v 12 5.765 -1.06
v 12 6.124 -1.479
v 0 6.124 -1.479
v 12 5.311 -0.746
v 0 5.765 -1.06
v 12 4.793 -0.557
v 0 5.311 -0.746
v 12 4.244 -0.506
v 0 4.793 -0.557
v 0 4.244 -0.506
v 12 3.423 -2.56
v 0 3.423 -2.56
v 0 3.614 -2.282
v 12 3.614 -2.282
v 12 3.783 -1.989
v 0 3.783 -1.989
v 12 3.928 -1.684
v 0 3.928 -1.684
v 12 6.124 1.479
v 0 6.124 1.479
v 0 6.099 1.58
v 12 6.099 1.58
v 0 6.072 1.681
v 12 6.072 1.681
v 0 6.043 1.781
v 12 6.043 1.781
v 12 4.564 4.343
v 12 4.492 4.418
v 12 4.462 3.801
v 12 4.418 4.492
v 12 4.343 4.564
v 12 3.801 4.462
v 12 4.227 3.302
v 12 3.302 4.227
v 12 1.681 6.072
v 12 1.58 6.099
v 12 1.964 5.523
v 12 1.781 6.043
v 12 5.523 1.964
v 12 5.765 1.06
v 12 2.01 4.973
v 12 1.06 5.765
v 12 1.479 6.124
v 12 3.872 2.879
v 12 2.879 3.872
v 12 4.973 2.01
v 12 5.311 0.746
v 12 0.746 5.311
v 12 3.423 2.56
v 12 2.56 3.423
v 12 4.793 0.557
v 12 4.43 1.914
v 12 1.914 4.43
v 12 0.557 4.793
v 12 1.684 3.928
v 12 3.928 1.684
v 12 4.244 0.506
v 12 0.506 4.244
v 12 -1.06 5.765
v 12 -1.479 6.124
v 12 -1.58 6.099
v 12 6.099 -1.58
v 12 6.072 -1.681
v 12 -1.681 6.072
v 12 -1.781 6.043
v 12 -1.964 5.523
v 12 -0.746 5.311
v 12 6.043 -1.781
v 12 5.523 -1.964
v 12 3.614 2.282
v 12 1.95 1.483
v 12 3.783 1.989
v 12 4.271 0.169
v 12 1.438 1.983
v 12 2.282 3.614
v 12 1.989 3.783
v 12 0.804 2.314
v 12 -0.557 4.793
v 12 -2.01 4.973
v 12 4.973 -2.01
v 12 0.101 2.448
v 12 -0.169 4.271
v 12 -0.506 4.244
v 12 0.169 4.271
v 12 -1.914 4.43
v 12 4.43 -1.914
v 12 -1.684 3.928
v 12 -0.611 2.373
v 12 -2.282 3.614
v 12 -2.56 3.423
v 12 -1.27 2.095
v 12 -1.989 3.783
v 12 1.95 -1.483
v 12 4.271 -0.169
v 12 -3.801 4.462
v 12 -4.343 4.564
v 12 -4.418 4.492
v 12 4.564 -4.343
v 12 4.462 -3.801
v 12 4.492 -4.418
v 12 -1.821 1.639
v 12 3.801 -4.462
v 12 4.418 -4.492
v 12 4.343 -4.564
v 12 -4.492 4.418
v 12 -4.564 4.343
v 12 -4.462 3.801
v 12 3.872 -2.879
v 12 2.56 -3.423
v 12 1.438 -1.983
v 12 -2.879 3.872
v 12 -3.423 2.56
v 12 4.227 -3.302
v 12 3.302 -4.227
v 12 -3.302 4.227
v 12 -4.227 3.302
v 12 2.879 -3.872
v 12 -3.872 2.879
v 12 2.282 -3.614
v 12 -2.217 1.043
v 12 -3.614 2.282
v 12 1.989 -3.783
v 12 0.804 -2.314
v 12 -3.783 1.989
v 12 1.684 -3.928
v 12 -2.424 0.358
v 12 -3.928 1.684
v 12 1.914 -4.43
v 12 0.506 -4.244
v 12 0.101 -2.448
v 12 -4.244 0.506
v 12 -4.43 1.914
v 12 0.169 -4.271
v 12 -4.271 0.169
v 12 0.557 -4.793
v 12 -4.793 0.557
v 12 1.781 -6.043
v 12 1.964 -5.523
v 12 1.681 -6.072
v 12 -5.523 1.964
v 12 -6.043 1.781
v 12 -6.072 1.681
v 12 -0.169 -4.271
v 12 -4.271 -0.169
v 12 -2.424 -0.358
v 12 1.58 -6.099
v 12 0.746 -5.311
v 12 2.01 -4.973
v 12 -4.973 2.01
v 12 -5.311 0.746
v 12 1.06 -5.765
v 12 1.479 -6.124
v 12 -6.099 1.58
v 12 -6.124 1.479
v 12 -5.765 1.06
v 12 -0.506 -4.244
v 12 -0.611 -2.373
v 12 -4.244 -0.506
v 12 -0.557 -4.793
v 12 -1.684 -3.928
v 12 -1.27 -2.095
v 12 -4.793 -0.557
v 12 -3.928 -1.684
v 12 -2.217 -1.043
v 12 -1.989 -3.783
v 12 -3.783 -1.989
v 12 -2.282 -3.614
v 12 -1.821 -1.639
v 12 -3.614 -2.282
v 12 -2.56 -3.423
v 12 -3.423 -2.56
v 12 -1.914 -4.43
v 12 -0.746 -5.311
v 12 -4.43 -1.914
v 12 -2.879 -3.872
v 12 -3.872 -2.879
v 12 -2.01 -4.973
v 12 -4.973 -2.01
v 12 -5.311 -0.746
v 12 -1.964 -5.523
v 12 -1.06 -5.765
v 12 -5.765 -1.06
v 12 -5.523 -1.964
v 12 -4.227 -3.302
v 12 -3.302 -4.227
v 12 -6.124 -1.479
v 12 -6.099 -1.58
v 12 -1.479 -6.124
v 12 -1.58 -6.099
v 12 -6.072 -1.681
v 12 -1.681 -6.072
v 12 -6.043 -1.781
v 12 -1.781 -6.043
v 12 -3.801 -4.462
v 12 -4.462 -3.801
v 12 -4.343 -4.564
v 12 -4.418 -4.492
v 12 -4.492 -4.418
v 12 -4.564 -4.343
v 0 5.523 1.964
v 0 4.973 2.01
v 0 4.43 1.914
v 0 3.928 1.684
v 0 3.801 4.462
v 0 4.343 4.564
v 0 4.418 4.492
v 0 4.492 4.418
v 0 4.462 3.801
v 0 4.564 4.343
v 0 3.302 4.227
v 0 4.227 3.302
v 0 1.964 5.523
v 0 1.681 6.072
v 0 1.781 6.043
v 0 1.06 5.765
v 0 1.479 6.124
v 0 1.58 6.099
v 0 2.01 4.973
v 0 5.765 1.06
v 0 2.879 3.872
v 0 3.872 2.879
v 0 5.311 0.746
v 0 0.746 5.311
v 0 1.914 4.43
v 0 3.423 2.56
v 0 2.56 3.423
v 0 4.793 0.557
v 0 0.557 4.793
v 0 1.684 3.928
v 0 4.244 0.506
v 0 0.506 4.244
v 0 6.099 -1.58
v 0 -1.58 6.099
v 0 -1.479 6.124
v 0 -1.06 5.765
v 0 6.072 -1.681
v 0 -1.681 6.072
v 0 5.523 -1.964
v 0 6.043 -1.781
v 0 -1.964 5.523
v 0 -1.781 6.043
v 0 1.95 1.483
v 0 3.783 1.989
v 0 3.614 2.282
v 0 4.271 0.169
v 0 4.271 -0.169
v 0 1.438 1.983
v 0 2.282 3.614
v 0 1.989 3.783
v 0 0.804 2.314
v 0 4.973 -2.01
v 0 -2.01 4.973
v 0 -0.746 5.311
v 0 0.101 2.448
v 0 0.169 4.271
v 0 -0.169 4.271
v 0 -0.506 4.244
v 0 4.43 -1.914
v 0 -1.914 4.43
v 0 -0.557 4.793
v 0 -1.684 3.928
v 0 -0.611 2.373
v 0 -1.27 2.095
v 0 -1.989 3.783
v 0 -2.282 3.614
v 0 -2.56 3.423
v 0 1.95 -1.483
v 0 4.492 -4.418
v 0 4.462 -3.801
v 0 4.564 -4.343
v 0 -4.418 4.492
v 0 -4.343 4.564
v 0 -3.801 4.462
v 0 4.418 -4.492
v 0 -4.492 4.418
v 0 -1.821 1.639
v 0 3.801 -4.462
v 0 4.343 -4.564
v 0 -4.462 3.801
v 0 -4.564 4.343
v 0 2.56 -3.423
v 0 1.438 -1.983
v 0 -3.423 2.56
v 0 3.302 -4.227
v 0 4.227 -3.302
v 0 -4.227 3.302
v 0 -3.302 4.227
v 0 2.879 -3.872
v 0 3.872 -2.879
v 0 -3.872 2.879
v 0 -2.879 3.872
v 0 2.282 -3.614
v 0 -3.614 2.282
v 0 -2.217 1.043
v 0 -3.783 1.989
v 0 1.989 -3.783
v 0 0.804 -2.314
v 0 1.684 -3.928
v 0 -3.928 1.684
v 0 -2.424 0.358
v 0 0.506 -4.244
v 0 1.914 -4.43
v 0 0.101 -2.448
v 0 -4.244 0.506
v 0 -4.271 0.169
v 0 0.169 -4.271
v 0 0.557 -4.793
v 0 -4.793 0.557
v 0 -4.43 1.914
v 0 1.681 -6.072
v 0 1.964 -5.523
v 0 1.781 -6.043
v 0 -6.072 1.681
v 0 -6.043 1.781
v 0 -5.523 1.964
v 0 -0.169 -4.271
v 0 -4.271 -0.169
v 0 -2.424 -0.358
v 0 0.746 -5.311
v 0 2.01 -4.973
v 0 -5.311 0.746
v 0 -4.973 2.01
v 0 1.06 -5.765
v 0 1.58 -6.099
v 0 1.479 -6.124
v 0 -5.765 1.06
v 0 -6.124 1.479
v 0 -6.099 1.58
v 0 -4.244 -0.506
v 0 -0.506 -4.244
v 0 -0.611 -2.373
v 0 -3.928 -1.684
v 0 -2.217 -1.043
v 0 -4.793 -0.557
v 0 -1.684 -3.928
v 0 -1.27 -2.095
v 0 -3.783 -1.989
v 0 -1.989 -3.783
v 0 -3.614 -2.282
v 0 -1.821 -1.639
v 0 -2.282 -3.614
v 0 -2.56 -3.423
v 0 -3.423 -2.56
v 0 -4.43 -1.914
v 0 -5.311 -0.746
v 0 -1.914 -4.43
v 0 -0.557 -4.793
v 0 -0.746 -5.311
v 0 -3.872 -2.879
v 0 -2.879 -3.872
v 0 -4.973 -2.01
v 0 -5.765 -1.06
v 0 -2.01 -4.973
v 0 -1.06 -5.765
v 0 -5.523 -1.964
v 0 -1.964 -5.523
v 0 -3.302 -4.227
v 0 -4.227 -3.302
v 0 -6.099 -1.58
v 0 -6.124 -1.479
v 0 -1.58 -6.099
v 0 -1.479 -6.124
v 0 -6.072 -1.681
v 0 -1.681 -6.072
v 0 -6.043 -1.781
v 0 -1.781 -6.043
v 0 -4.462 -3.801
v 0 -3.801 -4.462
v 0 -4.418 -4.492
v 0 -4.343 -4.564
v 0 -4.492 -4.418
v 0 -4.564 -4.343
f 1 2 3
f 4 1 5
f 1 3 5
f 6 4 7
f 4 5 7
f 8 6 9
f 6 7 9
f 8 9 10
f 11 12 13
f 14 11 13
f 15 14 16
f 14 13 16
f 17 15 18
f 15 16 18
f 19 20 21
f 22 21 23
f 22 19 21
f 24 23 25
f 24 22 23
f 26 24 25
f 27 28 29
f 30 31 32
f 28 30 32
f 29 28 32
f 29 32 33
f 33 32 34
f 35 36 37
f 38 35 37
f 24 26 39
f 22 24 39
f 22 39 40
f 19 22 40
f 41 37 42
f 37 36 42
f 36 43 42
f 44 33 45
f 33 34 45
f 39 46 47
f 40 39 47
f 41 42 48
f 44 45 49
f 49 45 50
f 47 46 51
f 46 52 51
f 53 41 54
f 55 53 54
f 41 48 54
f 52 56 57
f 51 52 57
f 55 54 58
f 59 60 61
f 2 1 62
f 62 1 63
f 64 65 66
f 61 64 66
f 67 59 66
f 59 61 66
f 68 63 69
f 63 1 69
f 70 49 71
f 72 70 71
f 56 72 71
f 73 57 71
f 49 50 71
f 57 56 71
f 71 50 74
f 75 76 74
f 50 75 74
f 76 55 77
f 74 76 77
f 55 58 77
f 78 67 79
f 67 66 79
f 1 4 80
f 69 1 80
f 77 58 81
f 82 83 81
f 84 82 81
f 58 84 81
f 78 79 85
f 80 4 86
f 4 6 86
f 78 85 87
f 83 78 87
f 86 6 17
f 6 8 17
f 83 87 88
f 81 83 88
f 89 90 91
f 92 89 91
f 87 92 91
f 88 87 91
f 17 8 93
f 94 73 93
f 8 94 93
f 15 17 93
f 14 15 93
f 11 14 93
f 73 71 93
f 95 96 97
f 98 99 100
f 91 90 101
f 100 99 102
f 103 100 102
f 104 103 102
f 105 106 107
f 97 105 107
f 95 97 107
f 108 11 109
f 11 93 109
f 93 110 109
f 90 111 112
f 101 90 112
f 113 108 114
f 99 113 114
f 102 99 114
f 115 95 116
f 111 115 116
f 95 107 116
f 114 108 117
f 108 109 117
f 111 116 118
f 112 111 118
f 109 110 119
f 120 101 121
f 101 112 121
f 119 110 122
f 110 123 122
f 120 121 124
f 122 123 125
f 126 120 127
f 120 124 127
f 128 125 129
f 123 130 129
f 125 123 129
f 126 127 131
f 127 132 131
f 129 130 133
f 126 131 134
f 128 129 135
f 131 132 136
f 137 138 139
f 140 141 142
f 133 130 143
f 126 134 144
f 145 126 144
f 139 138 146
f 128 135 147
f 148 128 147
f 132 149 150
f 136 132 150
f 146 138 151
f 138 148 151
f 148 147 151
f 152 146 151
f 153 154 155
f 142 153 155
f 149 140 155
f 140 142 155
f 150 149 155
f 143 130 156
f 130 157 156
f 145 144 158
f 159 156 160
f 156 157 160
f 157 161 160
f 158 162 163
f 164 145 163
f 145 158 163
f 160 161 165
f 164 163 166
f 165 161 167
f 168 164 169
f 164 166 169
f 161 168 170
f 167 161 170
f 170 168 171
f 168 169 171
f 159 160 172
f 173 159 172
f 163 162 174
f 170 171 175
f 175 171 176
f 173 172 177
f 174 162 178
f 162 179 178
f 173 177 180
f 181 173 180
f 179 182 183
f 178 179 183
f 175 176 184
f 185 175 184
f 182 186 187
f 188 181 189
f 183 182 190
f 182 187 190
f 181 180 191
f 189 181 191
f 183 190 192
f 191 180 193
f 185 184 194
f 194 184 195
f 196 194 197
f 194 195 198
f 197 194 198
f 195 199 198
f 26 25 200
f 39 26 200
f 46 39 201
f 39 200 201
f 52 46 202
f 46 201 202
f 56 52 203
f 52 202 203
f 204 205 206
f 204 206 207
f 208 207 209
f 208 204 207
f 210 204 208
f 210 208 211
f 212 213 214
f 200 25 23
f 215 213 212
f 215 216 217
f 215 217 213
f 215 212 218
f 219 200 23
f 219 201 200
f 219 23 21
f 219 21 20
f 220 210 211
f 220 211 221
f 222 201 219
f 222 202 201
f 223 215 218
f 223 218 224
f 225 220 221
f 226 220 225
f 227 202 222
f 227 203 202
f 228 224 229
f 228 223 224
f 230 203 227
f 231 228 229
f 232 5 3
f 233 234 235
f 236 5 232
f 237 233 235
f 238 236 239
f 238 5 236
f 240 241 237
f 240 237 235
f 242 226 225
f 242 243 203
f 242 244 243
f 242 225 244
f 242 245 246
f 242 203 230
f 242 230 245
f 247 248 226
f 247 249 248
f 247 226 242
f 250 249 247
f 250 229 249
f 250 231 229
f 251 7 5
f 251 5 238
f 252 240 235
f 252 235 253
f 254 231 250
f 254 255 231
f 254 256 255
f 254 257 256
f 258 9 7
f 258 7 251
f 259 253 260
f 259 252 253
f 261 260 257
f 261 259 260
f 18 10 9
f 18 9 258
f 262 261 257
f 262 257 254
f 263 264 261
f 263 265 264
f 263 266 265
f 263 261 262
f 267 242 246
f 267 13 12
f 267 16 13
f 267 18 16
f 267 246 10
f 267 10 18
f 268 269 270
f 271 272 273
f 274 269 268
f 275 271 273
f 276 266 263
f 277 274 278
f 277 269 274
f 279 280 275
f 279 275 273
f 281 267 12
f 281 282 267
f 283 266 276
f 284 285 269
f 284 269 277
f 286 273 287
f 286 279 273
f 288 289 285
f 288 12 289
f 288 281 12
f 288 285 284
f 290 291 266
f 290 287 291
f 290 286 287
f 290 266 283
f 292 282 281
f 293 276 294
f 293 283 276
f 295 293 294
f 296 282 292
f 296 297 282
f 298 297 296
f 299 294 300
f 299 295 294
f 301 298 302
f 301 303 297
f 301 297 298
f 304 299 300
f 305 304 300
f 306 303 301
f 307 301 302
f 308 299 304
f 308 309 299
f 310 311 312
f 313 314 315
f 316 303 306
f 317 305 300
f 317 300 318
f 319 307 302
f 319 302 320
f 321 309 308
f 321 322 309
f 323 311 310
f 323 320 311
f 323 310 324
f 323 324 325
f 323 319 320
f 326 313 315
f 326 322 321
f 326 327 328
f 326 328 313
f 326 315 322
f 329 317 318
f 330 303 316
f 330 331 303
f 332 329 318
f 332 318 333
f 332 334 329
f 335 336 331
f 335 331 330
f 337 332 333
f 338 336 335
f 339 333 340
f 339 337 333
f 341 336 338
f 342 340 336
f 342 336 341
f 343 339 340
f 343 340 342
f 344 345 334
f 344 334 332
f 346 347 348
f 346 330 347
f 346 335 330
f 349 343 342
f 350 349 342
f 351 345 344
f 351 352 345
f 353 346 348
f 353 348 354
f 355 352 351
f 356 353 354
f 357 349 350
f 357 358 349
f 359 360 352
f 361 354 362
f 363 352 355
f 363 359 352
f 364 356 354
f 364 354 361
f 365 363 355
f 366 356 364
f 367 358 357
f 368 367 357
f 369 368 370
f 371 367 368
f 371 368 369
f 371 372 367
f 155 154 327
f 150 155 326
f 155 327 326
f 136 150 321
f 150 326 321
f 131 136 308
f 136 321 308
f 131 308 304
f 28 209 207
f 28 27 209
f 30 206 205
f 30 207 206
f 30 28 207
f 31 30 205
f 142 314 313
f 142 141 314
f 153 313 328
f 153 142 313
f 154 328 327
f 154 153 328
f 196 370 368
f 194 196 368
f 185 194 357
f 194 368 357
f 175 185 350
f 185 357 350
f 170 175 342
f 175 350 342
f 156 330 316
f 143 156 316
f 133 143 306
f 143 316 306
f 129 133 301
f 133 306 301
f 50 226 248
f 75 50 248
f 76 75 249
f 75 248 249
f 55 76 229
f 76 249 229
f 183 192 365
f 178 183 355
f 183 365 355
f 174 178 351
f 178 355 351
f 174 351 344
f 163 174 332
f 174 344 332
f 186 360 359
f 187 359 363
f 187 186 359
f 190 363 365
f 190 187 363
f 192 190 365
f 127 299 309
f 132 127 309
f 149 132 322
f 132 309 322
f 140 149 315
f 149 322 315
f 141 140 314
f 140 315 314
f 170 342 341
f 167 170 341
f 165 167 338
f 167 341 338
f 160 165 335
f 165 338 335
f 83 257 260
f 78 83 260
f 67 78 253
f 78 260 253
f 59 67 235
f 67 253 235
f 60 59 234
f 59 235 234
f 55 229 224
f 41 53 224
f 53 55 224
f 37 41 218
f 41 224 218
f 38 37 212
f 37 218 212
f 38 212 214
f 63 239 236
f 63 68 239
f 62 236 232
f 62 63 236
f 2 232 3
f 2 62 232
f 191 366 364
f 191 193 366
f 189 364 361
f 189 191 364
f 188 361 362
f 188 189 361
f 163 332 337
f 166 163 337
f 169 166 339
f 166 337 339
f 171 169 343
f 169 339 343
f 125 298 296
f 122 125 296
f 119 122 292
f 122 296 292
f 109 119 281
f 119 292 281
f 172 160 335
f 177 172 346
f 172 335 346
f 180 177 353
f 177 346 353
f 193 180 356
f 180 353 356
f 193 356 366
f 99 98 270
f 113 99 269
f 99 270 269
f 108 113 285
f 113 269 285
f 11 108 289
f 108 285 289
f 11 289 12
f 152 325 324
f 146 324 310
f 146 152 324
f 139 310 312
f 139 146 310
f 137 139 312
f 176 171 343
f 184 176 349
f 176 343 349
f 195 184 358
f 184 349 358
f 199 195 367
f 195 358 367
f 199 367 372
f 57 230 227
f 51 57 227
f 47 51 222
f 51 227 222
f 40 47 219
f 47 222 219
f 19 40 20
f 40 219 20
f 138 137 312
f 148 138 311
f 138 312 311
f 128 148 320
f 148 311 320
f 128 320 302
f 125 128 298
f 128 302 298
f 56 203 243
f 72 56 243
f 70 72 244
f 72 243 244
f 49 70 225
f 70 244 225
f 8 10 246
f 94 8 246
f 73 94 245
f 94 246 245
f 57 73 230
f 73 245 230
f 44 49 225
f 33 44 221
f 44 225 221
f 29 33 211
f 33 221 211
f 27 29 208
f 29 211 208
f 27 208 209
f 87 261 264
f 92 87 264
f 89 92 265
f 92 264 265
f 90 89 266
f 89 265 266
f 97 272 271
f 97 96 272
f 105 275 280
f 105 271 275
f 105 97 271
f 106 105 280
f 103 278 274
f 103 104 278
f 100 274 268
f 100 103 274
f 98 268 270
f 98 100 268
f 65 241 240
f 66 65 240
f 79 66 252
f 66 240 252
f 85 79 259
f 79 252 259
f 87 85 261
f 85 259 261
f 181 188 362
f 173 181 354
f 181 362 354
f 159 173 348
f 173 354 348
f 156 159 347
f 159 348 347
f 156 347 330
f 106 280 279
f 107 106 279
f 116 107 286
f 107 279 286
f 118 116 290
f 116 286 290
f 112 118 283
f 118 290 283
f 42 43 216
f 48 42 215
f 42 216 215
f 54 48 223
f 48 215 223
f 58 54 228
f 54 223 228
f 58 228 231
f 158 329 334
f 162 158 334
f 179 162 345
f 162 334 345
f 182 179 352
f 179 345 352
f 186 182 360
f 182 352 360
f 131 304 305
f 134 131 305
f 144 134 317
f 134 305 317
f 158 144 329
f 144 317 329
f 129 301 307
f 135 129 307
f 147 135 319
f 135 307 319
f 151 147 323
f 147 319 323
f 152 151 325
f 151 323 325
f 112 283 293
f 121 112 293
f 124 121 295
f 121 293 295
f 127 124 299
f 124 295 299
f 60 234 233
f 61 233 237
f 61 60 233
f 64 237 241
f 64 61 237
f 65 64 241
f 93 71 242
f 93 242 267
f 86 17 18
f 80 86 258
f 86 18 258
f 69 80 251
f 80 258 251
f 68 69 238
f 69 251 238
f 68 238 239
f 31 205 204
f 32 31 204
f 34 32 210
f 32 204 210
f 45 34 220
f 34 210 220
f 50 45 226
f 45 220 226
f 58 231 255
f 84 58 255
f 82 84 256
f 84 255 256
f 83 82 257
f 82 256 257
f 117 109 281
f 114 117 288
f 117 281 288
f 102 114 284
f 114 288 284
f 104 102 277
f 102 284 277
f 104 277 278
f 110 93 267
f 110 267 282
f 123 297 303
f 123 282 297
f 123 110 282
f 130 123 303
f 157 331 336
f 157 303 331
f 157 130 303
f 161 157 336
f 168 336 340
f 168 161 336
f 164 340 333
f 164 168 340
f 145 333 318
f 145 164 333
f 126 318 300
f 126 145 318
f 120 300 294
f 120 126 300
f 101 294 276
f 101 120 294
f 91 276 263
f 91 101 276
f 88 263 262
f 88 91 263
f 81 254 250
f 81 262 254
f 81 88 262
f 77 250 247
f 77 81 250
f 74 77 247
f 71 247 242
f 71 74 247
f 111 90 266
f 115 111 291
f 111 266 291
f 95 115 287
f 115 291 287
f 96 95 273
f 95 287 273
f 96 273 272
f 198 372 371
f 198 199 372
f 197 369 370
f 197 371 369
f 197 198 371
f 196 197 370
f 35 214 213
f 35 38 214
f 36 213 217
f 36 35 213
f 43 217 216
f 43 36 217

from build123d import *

# Parameters (mm, degrees)
BASPROSKE_W     = 12
BASPROSKE_H     = 6.3
TOOTHCUT_DEPTH  = 15.945902448
TEETHCUTS_COUNT = 12
TEETHCUTS_ANGLE = 330
BORE_DEPTH      = 50.0000508


with BuildPart() as part:
    # BasProSke → Base-Revolve (revolve)
    with BuildSketch(Plane(origin=(0, 0, 0), x_dir=(1, 0, 0), z_dir=(0, 1, 0)), mode=Mode.PRIVATE) as base_revolve_sk:
        with Locations((6, 3.15)):
            Rectangle(BASPROSKE_W, BASPROSKE_H)
    revolve(base_revolve_sk.sketch.rotate(Axis((-10, 0, 0), (1, 0, 0)), 180), axis=Axis((-10, 0, 0), (1, 0, 0)))

    # TooCutSke → ToothCut (cut, through all)
    with BuildSketch(Plane(origin=(0, 0, 0), x_dir=(0, 0, -1), z_dir=(1, 0, 0))):
        with BuildLine():
            ThreePointArc((0.505712998, 4.243975773), (0, 4.274), (-0.505712998, 4.243975773))
            ThreePointArc((-0.505712998, 4.243975773), (-0.754225381, 5.326869831), (-1.508135905, 6.142980649))
            ThreePointArc((-1.508135905, 6.142980649), (0, 6.3254), (1.508135905, 6.142980649))
            ThreePointArc((1.508135905, 6.142980649), (0.754225381, 5.326869831), (0.505712998, 4.243975773))
        make_face()
    toothcut = extrude(amount=TOOTHCUT_DEPTH, mode=Mode.SUBTRACT)

    # TeethCuts: ToothCut ×12 about axis
    teethcuts_axis = Axis((-10, 0, 0), (1, 0, 0))
    for i in range(1, TEETHCUTS_COUNT):
        add(toothcut.rotate(teethcuts_axis, i * TEETHCUTS_ANGLE / (TEETHCUTS_COUNT - 1)), mode=Mode.SUBTRACT)

    # BorSke → Bore (cut, symmetric)
    with BuildSketch(Plane(origin=(0, 0, 0), x_dir=(0, 0, -1), z_dir=(1, 0, 0))):
        with BuildLine():
            Line((-1.483239697, 1.95), (1.483239697, 1.95))
            ThreePointArc((1.483239697, 1.95), (0, -2.45), (-1.483239697, 1.95))
        make_face()
    extrude(amount=BORE_DEPTH, both=True, mode=Mode.SUBTRACT)


solid = part.part
